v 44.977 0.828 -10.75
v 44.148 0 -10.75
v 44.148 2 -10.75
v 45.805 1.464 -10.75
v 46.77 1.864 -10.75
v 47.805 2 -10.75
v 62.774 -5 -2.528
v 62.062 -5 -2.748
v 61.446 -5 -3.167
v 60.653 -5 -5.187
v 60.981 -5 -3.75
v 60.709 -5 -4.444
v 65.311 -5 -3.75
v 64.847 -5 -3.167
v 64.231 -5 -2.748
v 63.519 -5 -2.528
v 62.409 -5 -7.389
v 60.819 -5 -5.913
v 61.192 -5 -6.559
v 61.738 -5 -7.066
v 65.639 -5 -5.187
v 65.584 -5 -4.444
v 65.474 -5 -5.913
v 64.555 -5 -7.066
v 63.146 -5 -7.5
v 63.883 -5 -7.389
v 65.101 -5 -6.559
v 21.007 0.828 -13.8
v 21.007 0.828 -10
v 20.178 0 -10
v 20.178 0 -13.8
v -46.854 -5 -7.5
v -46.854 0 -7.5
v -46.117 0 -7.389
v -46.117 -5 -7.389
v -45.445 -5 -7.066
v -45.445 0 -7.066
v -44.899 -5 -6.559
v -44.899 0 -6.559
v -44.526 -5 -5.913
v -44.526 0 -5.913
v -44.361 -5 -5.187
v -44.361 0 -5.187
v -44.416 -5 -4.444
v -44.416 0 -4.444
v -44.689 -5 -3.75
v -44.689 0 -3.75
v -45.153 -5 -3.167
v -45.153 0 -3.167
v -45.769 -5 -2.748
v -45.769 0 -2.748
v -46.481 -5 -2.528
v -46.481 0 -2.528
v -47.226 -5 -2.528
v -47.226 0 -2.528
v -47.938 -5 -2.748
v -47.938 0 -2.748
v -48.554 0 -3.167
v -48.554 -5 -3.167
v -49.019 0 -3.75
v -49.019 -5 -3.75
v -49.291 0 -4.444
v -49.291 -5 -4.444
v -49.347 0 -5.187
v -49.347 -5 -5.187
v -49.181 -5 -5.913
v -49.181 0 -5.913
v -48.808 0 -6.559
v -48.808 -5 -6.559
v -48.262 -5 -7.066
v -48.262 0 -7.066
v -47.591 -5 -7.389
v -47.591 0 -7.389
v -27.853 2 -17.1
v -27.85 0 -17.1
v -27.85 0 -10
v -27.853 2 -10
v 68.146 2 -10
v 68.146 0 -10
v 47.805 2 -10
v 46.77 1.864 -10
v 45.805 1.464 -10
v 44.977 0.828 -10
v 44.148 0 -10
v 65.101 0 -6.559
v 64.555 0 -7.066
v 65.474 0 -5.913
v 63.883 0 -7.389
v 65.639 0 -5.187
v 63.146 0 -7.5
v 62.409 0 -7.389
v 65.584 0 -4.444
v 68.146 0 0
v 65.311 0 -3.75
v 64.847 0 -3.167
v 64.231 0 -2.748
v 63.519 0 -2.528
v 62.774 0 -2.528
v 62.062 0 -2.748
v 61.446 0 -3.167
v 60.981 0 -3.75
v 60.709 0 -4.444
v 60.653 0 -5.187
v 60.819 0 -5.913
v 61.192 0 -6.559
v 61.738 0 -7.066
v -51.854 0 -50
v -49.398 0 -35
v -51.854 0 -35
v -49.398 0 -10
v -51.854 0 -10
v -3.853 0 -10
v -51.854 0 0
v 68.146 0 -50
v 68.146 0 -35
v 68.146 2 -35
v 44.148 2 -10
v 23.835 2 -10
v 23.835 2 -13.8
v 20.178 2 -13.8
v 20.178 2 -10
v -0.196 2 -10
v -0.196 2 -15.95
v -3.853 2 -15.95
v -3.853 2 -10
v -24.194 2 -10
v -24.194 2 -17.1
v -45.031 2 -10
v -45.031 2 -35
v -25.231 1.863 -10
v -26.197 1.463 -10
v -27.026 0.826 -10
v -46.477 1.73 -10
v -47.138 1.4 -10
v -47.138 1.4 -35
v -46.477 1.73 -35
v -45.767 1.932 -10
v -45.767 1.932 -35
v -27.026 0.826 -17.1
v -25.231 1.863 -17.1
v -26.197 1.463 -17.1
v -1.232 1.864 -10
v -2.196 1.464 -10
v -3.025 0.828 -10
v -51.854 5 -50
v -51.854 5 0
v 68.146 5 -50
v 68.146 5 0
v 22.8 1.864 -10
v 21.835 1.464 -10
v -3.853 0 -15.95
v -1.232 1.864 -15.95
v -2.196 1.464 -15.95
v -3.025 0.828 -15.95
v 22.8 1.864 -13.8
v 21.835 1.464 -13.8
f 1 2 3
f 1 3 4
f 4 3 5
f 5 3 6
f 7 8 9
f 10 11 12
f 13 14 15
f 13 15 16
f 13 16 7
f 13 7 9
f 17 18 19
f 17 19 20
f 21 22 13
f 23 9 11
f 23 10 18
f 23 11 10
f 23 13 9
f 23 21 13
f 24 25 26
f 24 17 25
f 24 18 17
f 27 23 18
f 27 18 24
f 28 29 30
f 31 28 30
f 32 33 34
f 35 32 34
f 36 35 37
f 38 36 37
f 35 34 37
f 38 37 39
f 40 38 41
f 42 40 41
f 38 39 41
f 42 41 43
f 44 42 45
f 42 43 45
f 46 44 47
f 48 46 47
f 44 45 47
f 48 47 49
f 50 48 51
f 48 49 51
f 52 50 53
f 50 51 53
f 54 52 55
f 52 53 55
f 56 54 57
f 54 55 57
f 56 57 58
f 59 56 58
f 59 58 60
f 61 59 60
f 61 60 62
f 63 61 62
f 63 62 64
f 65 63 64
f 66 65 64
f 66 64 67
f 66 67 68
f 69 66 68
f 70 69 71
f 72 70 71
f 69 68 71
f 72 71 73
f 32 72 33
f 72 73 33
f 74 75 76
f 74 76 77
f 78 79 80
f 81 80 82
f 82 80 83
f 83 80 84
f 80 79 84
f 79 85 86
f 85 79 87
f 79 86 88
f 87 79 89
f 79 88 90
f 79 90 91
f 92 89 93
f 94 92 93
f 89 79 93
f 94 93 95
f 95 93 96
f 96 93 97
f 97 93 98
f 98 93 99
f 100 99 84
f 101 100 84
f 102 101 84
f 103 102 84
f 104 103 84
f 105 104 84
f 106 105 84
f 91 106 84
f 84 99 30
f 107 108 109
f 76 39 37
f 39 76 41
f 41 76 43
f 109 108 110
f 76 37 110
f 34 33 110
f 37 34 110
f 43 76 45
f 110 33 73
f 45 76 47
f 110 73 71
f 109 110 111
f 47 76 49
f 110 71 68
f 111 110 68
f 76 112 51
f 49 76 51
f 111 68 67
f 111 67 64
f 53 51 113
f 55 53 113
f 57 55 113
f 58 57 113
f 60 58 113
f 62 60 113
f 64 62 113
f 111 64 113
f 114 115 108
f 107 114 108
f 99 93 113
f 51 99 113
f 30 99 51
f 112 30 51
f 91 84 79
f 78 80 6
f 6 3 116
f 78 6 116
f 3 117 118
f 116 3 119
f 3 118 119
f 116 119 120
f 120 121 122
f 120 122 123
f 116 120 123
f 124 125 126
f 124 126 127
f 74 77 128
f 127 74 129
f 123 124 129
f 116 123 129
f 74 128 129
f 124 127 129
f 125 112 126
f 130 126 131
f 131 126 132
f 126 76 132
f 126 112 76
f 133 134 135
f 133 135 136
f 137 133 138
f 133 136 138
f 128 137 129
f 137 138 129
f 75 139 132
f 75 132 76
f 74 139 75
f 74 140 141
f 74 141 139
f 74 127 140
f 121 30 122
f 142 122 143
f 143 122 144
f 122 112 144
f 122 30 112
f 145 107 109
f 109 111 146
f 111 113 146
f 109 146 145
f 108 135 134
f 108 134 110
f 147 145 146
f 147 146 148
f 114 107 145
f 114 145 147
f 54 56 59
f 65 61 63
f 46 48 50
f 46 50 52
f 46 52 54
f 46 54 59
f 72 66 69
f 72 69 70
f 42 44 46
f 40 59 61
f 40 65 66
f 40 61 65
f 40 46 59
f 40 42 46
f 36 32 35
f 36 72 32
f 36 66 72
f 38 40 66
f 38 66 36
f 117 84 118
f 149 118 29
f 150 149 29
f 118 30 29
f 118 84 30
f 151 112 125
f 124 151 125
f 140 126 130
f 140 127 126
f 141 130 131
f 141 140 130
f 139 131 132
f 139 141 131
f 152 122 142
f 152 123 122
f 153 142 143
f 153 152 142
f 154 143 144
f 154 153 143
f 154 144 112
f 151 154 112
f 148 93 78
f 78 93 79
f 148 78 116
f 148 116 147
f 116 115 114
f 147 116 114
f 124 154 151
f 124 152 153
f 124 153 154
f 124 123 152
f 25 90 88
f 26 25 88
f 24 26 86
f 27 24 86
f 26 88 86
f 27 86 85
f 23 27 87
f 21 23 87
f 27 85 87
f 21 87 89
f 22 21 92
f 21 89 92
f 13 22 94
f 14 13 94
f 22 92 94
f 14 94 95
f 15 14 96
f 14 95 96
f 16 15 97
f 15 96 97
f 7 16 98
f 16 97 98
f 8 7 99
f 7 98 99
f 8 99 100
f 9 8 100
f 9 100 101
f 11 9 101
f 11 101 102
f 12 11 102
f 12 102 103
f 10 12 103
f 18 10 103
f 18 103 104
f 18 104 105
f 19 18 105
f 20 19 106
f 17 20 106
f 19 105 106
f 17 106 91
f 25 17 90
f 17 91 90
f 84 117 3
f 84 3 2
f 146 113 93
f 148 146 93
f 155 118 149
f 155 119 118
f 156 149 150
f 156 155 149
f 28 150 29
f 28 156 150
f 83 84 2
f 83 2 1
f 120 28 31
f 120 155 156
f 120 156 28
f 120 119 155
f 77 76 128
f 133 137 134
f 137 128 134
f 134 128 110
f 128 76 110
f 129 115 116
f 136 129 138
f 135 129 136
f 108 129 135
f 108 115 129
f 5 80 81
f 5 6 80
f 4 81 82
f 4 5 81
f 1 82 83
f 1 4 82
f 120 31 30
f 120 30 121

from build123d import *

# Parameters (mm, degrees)
SKETCH1_W               = 120
SKETCH1_H               = 50
BOSS_EXTRUDE1_DEPTH     = 5
CUT_EXTRUDE1_DEPTH      = 131.096118313
CUT_EXTRUDE1_DEPTH_BACK = 120
SKETCH2_W               = 25
SKETCH2_H               = 2
BOSS_EXTRUDE2_DEPTH     = 0.75
BOSS_EXTRUDE3_DEPTH     = 3.8
BOSS_EXTRUDE4_DEPTH     = 5.95
BOSS_EXTRUDE6_DEPTH     = 7.1
SKETCH10_R              = 2.5
BOSS_EXTRUDE7_DEPTH     = 5
BOSS_EXTRUDE8_DEPTH     = 25
SKETCH12_W              = 2.455775423
SKETCH12_H              = 2
BOSS_EXTRUDE9_DEPTH     = 25
FILLET1_R               = 4


with BuildPart() as part:
    # Sketch1 → Boss-Extrude1 (new body)
    with BuildSketch(Plane(origin=(0, 0, 0), x_dir=(1, 0, 0), z_dir=(0, 1, 0))):
        with Locations((8.146341463, 25)):
            Rectangle(SKETCH1_W, SKETCH1_H)
    extrude(amount=BOSS_EXTRUDE1_DEPTH)

    # Sketch2 → Cut-Extrude1 (cut, two sides: drawn at the far end of the back side and taken through both)
    with BuildSketch(Plane(origin=(68.146341463, 0, 0), x_dir=(0, 0, -1), z_dir=(1, 0, 0)).offset(-CUT_EXTRUDE1_DEPTH_BACK)):
        with Locations((22.5, 1)):
            Rectangle(SKETCH2_W, SKETCH2_H)
    extrude(amount=CUT_EXTRUDE1_DEPTH + CUT_EXTRUDE1_DEPTH_BACK, mode=Mode.SUBTRACT)

    # Sketch5 → Boss-Extrude2 (add)
    with BuildSketch(Plane(origin=(0, 0, -10), x_dir=(-1, 0, 0), z_dir=(0, 0, -1))):
        Polygon((-44.148415926, 0), (-46.148415926, 2), (-44.148415926, 2), align=None)
    extrude(amount=BOSS_EXTRUDE2_DEPTH)

    # Sketch6 → Boss-Extrude3 (add)
    with BuildSketch(Plane(origin=(0, 0, -10), x_dir=(-1, 0, 0), z_dir=(0, 0, -1))):
        Polygon((-20.178332659, 0), (-20.178332659, 2), (-22.178332659, 2), align=None)
    extrude(amount=BOSS_EXTRUDE3_DEPTH)

    # Sketch7 → Boss-Extrude4 (add)
    with BuildSketch(Plane(origin=(0, 0, -10), x_dir=(-1, 0, 0), z_dir=(0, 0, -1))):
        Polygon((3.853324248, 0), (3.853324248, 2), (1.853324248, 2), align=None)
    extrude(amount=BOSS_EXTRUDE4_DEPTH)

    # Sketch9 → Boss-Extrude6 (add)
    with BuildSketch(Plane(origin=(0, 0, -10), x_dir=(-1, 0, 0), z_dir=(0, 0, -1))):
        Polygon((27.849622994, 0), (27.853491393, 2), (25.853491393, 2), align=None)
    extrude(amount=BOSS_EXTRUDE6_DEPTH)

    # Sketch10 → Boss-Extrude7 (add)
    with BuildSketch(Plane.XZ):
        with Locations(Location((-46.853658537, -5, 0), (0, 0, 270))):
            Circle(SKETCH10_R)
        with Locations(Location((63.146341463, -5, 0), (0, 0, 270))):
            Circle(SKETCH10_R)
    extrude(amount=BOSS_EXTRUDE7_DEPTH)

    # Sketch11 → Boss-Extrude8 (add)
    with BuildSketch(Plane(origin=(0, 0, -10), x_dir=(-1, 0, 0), z_dir=(0, 0, -1))):
        Polygon((49.397883114, 0), (49.397883114, 2), (46.169924942, 2), align=None)
    extrude(amount=BOSS_EXTRUDE8_DEPTH)

    # Sketch12 → Boss-Extrude9 (add)
    with BuildSketch(Plane(origin=(0, 0, -10), x_dir=(-1, 0, 0), z_dir=(0, 0, -1))):
        with Locations((50.625770825, 1)):
            Rectangle(SKETCH12_W, SKETCH12_H)
    extrude(amount=BOSS_EXTRUDE9_DEPTH)

    # Fillet1
    fillet1_edges = [part.edges().sort_by_distance(p)[0] for p in [
        (-46.169924942, 2, -22.5),
        (46.148415926, 2, -10.375),
        (22.178332659, 2, -11.9),
        (-1.853324248, 2, -12.975),
        (-25.853491393, 2, -13.55),
    ]]
    fillet(fillet1_edges, radius=FILLET1_R)


solid = part.part
